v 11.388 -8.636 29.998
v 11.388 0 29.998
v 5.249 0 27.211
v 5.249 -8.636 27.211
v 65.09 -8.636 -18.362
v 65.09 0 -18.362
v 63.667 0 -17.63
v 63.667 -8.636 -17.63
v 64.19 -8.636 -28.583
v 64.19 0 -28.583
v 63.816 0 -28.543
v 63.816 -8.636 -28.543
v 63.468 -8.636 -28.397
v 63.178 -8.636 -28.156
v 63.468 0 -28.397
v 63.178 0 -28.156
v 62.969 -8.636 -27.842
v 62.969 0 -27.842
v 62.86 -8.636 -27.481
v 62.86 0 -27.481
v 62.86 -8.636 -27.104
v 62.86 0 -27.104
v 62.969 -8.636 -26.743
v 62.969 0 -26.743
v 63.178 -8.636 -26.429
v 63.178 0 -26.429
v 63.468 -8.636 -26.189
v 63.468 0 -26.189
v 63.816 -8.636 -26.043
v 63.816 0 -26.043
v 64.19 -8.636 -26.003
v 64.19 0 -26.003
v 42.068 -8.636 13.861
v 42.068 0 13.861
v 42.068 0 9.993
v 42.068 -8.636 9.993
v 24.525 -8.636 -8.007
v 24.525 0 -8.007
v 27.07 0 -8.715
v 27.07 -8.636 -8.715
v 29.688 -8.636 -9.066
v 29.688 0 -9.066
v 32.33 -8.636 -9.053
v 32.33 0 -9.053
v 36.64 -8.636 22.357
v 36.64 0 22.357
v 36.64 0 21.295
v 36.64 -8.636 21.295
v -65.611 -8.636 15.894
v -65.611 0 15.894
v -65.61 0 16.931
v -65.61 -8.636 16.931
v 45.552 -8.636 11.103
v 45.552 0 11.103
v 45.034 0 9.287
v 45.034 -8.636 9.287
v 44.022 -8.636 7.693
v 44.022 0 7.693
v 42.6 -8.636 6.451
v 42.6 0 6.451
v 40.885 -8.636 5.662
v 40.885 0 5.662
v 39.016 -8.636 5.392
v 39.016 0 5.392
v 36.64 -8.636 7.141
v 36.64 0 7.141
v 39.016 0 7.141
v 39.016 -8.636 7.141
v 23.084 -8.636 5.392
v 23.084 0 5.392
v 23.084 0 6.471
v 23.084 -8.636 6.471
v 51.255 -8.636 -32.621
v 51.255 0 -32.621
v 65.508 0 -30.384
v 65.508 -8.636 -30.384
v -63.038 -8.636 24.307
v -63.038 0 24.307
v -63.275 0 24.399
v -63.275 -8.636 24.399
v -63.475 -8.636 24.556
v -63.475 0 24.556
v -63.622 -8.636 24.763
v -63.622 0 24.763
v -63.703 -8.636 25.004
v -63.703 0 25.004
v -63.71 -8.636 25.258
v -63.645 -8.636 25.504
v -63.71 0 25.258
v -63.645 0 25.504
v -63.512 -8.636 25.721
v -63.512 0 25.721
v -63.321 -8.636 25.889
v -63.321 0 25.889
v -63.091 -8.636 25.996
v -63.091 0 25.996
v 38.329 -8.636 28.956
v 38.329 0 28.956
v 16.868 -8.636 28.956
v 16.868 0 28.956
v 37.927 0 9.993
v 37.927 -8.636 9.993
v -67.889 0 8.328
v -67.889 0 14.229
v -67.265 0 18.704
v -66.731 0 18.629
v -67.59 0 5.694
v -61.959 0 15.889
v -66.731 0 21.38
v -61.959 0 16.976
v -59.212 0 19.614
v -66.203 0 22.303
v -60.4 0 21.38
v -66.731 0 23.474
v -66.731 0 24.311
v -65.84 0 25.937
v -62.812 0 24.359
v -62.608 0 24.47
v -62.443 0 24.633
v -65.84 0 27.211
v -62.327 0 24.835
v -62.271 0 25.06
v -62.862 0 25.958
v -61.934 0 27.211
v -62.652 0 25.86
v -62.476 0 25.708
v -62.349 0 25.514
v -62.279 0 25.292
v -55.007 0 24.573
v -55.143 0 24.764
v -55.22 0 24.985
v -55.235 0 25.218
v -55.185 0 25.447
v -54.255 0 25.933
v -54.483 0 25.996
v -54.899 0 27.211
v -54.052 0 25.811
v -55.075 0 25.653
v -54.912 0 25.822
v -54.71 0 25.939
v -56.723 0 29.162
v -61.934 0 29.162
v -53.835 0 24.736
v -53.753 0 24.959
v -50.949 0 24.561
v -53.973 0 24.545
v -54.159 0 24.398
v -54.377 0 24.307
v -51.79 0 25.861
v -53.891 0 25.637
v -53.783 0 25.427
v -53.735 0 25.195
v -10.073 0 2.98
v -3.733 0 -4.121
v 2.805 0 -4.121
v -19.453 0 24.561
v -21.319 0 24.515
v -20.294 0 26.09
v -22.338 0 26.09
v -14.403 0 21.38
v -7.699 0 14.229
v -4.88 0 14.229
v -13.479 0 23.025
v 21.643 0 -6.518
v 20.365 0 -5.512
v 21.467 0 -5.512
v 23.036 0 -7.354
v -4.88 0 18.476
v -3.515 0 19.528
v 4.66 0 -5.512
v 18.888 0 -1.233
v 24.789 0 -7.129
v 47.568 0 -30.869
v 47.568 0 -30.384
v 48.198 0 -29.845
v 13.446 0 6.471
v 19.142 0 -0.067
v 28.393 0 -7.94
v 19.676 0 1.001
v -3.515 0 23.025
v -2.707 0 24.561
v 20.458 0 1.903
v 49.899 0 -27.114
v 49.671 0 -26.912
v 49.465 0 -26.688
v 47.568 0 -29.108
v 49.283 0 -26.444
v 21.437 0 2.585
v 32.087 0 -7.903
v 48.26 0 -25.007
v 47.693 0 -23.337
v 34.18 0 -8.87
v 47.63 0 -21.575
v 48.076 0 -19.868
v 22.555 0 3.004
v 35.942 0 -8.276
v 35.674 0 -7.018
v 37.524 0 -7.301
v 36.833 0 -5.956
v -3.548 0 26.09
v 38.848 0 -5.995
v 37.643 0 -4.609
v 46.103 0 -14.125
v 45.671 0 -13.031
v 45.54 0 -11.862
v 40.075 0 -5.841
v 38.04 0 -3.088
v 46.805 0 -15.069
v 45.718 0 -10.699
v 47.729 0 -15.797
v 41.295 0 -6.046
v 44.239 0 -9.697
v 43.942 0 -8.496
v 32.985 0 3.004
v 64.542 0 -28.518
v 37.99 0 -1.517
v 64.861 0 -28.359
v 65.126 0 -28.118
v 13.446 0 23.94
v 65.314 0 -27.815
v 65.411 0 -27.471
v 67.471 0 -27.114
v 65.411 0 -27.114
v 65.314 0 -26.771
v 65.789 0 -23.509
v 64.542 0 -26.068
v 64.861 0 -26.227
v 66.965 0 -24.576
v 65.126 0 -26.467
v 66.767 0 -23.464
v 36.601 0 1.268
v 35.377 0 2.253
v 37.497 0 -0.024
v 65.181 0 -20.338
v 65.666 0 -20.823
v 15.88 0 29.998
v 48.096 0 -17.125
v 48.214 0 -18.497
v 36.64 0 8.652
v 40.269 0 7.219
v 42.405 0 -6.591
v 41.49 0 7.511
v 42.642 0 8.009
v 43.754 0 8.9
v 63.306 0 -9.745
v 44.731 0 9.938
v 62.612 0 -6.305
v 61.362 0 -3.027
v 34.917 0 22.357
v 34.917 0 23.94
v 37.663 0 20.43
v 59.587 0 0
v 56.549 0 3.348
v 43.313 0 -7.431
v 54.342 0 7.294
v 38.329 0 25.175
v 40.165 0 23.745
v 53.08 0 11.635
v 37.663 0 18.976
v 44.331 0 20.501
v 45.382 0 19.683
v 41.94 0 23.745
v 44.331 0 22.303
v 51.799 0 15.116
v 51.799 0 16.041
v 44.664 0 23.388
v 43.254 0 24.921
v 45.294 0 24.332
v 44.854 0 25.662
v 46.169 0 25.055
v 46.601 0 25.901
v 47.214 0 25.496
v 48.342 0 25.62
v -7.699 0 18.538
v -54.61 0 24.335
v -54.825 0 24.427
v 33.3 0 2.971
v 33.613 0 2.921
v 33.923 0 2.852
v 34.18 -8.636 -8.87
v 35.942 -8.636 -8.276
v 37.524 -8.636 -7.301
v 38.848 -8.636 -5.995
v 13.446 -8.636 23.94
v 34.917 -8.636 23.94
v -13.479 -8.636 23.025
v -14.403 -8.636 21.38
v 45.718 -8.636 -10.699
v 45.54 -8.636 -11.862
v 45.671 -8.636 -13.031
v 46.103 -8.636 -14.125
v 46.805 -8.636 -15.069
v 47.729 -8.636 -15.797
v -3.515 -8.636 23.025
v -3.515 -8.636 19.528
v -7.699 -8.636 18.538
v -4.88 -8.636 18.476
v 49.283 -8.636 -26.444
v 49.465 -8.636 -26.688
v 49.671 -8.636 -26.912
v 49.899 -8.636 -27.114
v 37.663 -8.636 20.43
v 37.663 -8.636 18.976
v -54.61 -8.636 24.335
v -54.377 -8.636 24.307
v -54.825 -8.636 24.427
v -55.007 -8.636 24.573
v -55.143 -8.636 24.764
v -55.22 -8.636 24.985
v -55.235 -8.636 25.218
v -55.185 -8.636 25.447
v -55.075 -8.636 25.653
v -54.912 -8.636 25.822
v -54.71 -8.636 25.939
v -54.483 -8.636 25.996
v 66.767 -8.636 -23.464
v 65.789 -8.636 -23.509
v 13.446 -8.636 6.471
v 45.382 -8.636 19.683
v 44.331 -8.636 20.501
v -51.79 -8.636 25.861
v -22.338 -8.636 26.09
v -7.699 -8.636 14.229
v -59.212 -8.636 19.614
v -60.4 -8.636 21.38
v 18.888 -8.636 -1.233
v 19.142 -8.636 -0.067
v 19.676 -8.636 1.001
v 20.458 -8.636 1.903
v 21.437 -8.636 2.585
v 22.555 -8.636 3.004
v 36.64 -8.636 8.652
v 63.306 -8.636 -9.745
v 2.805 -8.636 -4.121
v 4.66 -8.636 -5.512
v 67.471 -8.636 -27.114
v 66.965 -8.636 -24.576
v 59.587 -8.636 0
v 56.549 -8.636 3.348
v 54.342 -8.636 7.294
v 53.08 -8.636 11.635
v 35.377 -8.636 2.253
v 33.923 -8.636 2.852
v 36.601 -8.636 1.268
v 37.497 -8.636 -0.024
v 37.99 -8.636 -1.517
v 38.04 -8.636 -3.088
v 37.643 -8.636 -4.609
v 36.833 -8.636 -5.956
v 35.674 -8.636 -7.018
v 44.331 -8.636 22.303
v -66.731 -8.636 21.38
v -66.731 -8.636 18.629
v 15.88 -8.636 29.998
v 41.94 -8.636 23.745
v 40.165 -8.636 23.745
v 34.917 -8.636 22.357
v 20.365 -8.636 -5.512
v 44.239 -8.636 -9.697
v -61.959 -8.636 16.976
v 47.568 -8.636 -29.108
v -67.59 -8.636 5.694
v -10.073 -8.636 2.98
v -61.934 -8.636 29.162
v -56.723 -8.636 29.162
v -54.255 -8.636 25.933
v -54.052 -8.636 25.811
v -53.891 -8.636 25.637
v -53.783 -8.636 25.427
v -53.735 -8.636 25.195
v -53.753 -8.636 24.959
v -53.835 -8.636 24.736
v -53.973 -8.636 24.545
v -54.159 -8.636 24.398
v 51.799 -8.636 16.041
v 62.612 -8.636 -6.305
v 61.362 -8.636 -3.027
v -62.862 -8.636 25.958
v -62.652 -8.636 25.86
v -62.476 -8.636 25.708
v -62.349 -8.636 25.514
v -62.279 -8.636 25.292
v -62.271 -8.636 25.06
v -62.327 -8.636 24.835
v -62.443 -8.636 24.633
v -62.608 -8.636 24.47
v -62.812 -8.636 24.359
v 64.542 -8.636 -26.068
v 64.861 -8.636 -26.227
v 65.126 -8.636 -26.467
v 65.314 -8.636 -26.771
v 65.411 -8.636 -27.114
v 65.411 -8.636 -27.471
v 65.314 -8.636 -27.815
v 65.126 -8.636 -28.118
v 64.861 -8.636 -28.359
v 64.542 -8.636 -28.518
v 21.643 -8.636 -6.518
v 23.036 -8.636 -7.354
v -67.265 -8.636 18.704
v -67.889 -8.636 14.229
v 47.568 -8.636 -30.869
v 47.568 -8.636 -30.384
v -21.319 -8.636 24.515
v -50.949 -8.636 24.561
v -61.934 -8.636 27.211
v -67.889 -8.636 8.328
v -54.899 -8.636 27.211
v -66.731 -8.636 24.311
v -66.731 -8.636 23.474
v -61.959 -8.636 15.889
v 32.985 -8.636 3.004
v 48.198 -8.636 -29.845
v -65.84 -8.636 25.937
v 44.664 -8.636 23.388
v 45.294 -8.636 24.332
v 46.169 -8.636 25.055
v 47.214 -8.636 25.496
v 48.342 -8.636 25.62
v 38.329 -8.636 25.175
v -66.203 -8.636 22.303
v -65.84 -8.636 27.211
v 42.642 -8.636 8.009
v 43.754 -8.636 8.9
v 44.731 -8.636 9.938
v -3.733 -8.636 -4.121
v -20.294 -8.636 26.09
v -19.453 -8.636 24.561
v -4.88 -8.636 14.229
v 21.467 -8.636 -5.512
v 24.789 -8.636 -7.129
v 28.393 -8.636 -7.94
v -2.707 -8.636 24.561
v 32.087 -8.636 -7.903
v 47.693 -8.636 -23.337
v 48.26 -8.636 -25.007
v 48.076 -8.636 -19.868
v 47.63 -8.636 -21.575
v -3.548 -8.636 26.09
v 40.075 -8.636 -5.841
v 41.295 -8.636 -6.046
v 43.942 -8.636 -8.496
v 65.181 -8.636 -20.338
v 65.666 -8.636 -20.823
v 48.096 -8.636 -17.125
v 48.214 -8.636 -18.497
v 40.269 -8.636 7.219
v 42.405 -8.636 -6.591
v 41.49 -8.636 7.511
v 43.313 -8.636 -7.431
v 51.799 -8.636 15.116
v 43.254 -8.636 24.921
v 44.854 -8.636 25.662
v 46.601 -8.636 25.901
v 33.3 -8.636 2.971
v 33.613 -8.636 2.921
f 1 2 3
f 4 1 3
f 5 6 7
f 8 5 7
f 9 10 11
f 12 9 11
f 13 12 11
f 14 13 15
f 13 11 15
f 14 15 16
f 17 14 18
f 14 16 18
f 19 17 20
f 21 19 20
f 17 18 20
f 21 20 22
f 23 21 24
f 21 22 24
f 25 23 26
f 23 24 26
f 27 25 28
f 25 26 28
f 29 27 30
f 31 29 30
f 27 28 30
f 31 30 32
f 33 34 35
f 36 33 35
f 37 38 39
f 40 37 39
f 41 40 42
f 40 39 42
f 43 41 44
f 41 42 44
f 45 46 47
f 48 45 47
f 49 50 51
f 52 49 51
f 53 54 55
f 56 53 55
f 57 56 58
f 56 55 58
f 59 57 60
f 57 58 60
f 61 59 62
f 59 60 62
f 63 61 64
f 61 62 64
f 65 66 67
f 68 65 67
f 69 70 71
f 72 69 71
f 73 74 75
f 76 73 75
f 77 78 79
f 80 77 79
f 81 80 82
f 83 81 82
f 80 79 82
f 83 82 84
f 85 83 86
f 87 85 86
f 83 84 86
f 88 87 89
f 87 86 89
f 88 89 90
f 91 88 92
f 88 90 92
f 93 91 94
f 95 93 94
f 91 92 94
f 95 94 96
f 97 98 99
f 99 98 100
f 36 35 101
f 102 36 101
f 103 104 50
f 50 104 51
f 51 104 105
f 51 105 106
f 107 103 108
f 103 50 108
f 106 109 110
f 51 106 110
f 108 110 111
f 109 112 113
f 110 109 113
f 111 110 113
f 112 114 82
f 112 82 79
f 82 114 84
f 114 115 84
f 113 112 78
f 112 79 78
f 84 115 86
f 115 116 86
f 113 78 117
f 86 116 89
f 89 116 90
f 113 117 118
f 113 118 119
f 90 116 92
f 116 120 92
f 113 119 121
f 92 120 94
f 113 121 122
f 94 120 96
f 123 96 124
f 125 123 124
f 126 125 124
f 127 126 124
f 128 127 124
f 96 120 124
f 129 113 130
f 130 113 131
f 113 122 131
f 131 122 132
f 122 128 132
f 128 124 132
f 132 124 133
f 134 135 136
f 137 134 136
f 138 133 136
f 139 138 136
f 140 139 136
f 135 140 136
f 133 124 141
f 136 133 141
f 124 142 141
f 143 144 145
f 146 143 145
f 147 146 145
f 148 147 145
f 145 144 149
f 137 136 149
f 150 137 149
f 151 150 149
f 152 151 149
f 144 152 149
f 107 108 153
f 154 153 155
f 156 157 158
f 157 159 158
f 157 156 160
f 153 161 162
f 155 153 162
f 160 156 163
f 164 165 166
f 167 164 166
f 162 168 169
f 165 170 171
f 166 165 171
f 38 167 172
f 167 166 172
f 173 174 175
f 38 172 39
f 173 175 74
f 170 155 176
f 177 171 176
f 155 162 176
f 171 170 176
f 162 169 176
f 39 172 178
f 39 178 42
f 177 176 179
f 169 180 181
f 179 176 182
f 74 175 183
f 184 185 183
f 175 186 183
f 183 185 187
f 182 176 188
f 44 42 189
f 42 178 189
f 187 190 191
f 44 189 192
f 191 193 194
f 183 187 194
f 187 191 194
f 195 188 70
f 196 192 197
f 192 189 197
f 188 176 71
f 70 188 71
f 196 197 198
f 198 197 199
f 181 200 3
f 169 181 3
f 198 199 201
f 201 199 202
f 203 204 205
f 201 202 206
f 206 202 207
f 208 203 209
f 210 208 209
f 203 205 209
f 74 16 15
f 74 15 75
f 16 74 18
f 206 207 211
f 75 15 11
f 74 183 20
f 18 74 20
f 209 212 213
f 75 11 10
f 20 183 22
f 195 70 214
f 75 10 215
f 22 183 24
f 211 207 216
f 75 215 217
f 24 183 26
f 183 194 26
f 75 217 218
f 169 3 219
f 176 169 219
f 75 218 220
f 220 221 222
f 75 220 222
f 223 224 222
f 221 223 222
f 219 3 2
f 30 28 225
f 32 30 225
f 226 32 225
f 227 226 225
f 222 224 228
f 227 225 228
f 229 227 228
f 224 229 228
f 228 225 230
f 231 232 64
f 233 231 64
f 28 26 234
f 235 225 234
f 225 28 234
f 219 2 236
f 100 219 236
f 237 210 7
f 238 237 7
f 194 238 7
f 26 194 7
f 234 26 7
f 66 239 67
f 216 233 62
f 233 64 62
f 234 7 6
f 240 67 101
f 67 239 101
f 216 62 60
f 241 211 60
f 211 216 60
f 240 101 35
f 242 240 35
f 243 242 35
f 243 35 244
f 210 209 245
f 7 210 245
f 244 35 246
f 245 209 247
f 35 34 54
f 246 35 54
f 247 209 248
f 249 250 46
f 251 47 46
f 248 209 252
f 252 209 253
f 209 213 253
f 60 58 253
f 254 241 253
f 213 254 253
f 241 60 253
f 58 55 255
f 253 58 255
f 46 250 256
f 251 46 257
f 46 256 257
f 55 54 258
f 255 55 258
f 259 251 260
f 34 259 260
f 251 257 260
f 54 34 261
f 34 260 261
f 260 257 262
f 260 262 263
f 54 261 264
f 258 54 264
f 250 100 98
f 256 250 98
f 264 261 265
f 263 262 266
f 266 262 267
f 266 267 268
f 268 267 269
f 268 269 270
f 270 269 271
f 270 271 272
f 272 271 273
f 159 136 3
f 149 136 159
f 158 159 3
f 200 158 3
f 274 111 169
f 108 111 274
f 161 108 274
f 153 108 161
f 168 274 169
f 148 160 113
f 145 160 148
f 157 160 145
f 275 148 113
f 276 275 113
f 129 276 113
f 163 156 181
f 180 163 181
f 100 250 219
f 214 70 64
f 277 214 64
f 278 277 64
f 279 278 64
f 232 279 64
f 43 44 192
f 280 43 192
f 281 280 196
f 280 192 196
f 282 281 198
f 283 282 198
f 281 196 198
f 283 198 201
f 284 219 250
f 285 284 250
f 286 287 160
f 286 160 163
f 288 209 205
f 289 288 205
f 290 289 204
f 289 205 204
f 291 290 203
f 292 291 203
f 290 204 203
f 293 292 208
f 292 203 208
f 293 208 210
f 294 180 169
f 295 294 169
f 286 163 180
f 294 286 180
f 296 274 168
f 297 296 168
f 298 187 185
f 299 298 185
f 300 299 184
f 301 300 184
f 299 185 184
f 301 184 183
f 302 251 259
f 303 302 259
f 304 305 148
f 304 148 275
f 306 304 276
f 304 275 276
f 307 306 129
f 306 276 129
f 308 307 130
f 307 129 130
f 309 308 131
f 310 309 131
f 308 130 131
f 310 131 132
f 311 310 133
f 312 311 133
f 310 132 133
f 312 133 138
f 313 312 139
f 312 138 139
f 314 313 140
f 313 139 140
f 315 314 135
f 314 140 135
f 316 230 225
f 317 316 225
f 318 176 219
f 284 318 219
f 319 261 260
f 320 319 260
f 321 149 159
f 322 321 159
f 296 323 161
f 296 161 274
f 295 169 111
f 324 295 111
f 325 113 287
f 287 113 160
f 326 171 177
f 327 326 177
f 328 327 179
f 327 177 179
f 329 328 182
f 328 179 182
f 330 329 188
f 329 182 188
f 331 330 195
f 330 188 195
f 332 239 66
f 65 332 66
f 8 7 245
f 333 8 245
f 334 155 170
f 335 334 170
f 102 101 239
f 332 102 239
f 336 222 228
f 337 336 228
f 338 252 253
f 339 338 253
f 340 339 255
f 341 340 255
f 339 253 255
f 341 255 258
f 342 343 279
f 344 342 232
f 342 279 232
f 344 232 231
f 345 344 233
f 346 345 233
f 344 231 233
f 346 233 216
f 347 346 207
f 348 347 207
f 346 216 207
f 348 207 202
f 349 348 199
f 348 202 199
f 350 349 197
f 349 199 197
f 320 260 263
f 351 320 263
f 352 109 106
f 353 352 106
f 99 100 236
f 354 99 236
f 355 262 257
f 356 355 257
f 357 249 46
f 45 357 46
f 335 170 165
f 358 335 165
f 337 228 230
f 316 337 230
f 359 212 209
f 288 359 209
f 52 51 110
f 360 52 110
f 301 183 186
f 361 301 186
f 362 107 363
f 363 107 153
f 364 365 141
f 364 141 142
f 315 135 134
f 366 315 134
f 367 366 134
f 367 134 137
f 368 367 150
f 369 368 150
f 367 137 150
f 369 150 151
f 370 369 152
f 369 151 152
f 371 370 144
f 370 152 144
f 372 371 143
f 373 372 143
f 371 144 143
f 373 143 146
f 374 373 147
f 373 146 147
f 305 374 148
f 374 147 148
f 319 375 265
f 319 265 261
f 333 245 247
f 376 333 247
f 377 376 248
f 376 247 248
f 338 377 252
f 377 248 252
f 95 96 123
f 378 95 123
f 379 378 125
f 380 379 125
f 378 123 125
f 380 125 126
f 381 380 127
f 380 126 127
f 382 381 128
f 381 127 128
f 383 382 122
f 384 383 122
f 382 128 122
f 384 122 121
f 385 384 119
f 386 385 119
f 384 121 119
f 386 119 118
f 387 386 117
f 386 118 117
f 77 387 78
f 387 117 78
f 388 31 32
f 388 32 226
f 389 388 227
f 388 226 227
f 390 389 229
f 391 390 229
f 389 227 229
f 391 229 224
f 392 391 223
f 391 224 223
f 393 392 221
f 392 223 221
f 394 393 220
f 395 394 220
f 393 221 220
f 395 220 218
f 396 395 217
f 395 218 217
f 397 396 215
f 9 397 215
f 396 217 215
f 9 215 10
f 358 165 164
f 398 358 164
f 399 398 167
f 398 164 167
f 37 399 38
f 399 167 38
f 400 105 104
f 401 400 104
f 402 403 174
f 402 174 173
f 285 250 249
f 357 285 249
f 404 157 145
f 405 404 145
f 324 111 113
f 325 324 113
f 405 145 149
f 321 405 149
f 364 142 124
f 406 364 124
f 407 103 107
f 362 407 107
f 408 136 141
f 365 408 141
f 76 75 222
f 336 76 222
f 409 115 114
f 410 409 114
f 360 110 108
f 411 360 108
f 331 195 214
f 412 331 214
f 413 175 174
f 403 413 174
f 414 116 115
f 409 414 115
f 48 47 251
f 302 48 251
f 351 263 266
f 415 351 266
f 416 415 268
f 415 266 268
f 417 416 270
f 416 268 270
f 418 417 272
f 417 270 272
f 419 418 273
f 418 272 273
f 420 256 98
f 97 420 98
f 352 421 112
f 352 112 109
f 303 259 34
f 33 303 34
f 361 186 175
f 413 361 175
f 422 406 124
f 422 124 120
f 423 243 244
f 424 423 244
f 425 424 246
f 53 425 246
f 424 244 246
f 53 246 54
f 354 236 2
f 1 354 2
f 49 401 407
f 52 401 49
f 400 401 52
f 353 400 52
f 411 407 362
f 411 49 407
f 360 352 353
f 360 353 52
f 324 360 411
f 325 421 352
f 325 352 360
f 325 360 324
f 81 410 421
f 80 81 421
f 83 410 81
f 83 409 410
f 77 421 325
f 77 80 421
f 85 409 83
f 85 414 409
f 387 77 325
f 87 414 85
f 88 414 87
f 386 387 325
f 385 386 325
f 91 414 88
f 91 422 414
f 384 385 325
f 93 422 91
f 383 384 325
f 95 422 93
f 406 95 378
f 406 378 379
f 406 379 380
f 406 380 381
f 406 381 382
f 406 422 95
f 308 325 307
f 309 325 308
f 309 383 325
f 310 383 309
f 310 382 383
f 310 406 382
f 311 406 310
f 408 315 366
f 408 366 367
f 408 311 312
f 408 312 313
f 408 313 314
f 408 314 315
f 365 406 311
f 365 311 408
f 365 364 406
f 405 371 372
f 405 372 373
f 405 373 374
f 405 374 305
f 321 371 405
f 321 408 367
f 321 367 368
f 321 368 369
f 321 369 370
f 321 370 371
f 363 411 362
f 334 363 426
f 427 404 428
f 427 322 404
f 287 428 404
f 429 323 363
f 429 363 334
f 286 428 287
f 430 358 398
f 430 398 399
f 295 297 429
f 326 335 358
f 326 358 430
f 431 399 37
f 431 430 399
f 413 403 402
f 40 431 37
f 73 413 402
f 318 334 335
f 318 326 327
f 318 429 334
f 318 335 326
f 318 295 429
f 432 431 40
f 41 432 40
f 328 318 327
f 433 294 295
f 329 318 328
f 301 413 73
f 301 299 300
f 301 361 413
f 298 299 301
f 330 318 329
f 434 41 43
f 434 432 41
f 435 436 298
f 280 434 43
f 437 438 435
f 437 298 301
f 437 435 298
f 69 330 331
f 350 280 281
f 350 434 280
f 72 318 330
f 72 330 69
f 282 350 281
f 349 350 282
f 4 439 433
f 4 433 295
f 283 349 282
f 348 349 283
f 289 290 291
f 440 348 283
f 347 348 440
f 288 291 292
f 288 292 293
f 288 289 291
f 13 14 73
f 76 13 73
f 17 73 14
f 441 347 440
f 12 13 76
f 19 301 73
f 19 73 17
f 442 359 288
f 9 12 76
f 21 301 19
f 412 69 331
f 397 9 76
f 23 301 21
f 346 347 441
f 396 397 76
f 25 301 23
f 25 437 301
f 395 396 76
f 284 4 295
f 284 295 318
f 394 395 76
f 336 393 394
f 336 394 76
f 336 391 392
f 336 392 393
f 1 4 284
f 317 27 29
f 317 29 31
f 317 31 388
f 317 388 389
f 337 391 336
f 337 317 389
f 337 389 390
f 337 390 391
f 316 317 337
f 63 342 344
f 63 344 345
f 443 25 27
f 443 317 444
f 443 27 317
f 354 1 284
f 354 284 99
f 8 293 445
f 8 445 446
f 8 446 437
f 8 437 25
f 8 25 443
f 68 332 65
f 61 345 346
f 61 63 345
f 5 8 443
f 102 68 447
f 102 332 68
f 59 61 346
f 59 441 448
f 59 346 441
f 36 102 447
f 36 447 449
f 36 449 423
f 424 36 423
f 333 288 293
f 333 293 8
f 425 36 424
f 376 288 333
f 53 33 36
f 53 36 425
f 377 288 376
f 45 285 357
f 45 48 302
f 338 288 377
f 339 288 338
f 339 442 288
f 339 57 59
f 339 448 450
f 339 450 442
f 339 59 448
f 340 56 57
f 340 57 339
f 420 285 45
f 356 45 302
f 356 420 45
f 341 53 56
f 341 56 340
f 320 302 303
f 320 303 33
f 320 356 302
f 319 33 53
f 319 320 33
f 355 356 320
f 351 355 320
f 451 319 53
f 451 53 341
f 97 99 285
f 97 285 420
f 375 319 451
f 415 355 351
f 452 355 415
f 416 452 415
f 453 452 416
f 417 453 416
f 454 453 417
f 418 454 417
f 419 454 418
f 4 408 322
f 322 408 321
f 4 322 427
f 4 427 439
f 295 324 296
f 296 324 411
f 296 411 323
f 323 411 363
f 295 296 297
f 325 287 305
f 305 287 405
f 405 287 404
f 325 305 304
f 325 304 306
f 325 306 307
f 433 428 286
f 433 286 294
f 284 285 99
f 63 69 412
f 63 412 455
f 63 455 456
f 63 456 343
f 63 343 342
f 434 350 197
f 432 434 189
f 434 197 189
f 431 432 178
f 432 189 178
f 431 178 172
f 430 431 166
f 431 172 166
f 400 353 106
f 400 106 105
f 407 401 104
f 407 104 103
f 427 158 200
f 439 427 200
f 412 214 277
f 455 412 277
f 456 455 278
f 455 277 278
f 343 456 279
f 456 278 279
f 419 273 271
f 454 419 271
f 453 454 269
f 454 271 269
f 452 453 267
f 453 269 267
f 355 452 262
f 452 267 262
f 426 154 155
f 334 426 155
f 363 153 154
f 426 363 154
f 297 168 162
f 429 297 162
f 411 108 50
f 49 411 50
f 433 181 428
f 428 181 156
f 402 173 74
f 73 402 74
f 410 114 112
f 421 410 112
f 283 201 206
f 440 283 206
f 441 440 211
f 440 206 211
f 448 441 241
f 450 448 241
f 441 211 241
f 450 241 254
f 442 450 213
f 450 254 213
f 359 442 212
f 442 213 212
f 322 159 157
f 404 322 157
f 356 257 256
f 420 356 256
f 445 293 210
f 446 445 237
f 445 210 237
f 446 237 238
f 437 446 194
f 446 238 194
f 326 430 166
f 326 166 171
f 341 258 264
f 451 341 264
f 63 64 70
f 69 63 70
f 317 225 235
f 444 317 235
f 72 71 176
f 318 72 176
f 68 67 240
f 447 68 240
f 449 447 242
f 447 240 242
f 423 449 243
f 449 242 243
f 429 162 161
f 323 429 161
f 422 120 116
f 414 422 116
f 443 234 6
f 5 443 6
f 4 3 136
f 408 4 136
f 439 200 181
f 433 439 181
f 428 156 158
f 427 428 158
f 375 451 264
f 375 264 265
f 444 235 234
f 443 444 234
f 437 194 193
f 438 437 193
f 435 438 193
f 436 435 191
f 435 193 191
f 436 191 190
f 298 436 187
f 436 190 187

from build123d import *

# Parameters (mm, degrees)
F1_DEPTH = 8.636


with BuildPart() as f1:
    # F0 (on Front) → F1 (new body)
    with BuildSketch(Plane.XZ):
        with BuildLine():
            Line((-67.888543, 14.229136), (-67.888543, 8.327846))
            Line((-67.888543, 8.327846), (-67.590117, 5.694489))
            Line((-67.590117, 5.694489), (-10.072526, 2.980128))
            Line((-10.072526, 2.980128), (-3.732844, -4.12088))
            Line((-3.732844, -4.12088), (2.804628, -4.12088))
            Line((2.804628, -4.12088), (4.660426, -5.51241))
            Line((4.660426, -5.51241), (20.36539, -5.51241))
            ThreePointArc((20.36539, -5.51241), (22.326214, -6.957719), (24.524612, -8.006907))
            ThreePointArc((24.524612, -8.006907), (28.372895, -8.935837), (32.329973, -9.052986))
            ThreePointArc((32.329973, -9.052986), (35.941526, -8.275719), (38.847856, -5.995215))
            ThreePointArc((38.847856, -5.995215), (42.405349, -6.590703), (44.239189, -9.696728))
            Line((44.239189, -9.696728), (45.717698, -10.69943))
            ThreePointArc((45.717698, -10.69943), (45.850918, -13.592314), (47.728516, -15.797116))
            ThreePointArc((47.728516, -15.797116), (48.186683, -17.808436), (48.07616, -19.868318))
            ThreePointArc((48.07616, -19.868318), (47.693475, -23.337022), (49.28254, -26.443986))
            ThreePointArc((49.28254, -26.443986), (49.565033, -26.802415), (49.898703, -27.113765))
            Line((49.898703, -27.113765), (63.92391, -23.246003))
            Line((63.92391, -23.246003), (63.666757, -17.629698))
            Line((63.666757, -17.629698), (63.305743, -9.745057))
            ThreePointArc((63.305743, -9.745057), (62.05497, -4.640389), (59.587408, 0))
            ThreePointArc((59.587408, 0), (55.333048, 5.257953), (53.080335, 11.635331))
            Line((53.080335, 11.635331), (51.798906, 15.11586))
            Line((51.798906, 15.11586), (46.942841, 15.11586))
            ThreePointArc((46.942841, 15.11586), (46.45979, 13.035678), (45.55238, 11.102519))
            ThreePointArc((45.55238, 11.102519), (43.355932, 7.020729), (39.016269, 5.392008))
            Line((39.016269, 5.392008), (23.084078, 5.392008))
            Line((23.084078, 5.392008), (23.084078, 6.470653))
            Line((23.084078, 6.470653), (15.109499, 6.470653))
            Line((15.109499, 6.470653), (13.445796, 6.470653))
            Line((13.445796, 6.470653), (13.445796, 11.590629))
            Line((13.445796, 11.590629), (13.445796, 18.615682))
            Line((13.445796, 18.615682), (7.789209, 18.615682))
            Line((7.789209, 18.615682), (-7.699287, 18.537793))
            Line((-7.699287, 18.537793), (-4.879672, 18.475959))
            Line((-4.879672, 18.475959), (-4.879672, 14.229136))
            Line((-4.879672, 14.229136), (-7.699287, 14.229136))
            Line((-7.699287, 14.229136), (-67.888543, 14.229136))
        make_face()
        with BuildLine():
            ThreePointArc((18.888429, -1.232992), (20.03881, 1.476523), (22.555076, 3.004023))
            Line((22.555076, 3.004023), (28.890261, 3.004023))
            Line((28.890261, 3.004023), (32.984652, 3.004023))
            ThreePointArc((32.984652, 3.004023), (33.457255, 2.948329), (33.923268, 2.851961))
            ThreePointArc((33.923268, 2.851961), (37.989765, -1.51717), (35.673525, -7.018146))
            ThreePointArc((35.673525, -7.018146), (28.392646, -7.940351), (21.466842, -5.51241))
            Line((21.466842, -5.51241), (18.888429, -1.232992))
        make_face(mode=Mode.SUBTRACT)
        Polygon((-67.26525, 18.70371), (-67.888543, 14.229136), (-7.699287, 14.229136), (-7.699287, 18.537793), (-66.731323, 18.629336), align=None)
        Polygon((-65.611368, 15.894235), (-65.609761, 16.930796), (-61.958702, 16.97587), (-61.958702, 15.888571), align=None, mode=Mode.SUBTRACT)
        Polygon((-66.731323, 21.379774), (-66.731323, 18.629336), (-7.699287, 18.537793), (7.789209, 18.615682), (13.445796, 18.615682), (13.445796, 20.43255), (13.445796, 23.939529), (11.8609, 24.011148), (10.443351, 22.458594), (3.288107, 22.458594), (2.613084, 23.025269), (-3.514589, 23.025269), (-3.514589, 19.527677), (-59.21186, 19.614049), (-60.399957, 21.379774), align=None)
        Polygon((-66.20314, 22.302656), (-66.731323, 21.379774), (-60.399957, 21.379774), (-14.40332, 21.379774), (-13.479427, 23.025269), (-3.514589, 23.025269), (2.613084, 23.025269), (2.580326, 23.198023), (-17.181331, 23.198023), (-17.794525, 22.302656), align=None)
        with BuildLine():
            Line((-66.731323, 23.473777), (-66.20314, 22.302656))
            Line((-66.20314, 22.302656), (-17.794525, 22.302656))
            Line((-17.794525, 22.302656), (-17.181331, 23.198023))
            Line((-17.181331, 23.198023), (2.580326, 23.198023))
            Line((2.580326, 23.198023), (2.613084, 23.025269))
            Line((2.613084, 23.025269), (3.288107, 22.458594))
            Line((3.288107, 22.458594), (10.443351, 22.458594))
            Line((10.443351, 22.458594), (11.8609, 24.011148))
            Line((11.8609, 24.011148), (13.445796, 23.939529))
            Line((13.445796, 23.939529), (34.916848, 23.939529))
            Line((34.916848, 23.939529), (34.916848, 22.35744))
            Line((34.916848, 22.35744), (36.640268, 22.35744))
            Line((36.640268, 22.35744), (36.640268, 21.295426))
            Line((36.640268, 21.295426), (37.662946, 20.430082))
            Line((37.662946, 20.430082), (37.662946, 18.97577))
            Line((37.662946, 18.97577), (42.068332, 13.861337))
            Line((42.068332, 13.861337), (42.068332, 9.9928))
            Line((42.068332, 9.9928), (37.926942, 9.9928))
            Line((37.926942, 9.9928), (36.640268, 8.652356))
            Line((36.640268, 8.652356), (36.640268, 7.140663))
            Line((36.640268, 7.140663), (39.016269, 7.140663))
            ThreePointArc((39.016269, 7.140663), (40.885778, 7.338312), (42.642005, 8.008977))
            ThreePointArc((42.642005, 8.008977), (44.260743, 9.401881), (45.55238, 11.102519))
            ThreePointArc((45.55238, 11.102519), (46.45979, 13.035678), (46.942841, 15.11586))
            Line((46.942841, 15.11586), (51.798906, 15.11586))
            Line((51.798906, 15.11586), (51.798906, 16.040822))
            Line((51.798906, 16.040822), (45.381963, 19.682869))
            Line((45.381963, 19.682869), (42.202402, 18.006373))
            Line((42.202402, 18.006373), (40.930577, 18.006373))
            Line((40.930577, 18.006373), (38.329113, 19.682869))
            Line((38.329113, 19.682869), (38.329113, 25.174845))
            Line((38.329113, 25.174845), (38.329113, 28.956141))
            Line((38.329113, 28.956141), (16.867928, 28.956141))
            Line((16.867928, 28.956141), (15.879637, 29.998008))
            Line((15.879637, 29.998008), (15.187833, 29.998008))
            Line((15.187833, 29.998008), (11.387558, 29.998008))
            Line((11.387558, 29.998008), (5.248655, 27.211197))
            Line((5.248655, 27.211197), (-54.899268, 27.211197))
            Line((-54.899268, 27.211197), (-61.934408, 27.211197))
            Line((-61.934408, 27.211197), (-65.839738, 27.211197))
            Line((-65.839738, 27.211197), (-65.839738, 25.936976))
            Line((-65.839738, 25.936976), (-66.731323, 24.311243))
            Line((-66.731323, 24.311243), (-66.731323, 23.473777))
        make_face()
        with BuildLine():
            ThreePointArc((-63.038021, 24.306566), (-63.715772, 25.131149), (-63.090824, 25.996437))
            ThreePointArc((-63.090824, 25.996437), (-62.267006, 25.176418), (-63.038021, 24.306566))
        make_face(mode=Mode.SUBTRACT)
        with BuildLine():
            ThreePointArc((-54.377425, 24.306566), (-55.235893, 25.101148), (-54.483041, 25.996437))
            ThreePointArc((-54.483041, 25.996437), (-53.73549, 25.194922), (-54.377425, 24.306566))
        make_face(mode=Mode.SUBTRACT)
        Polygon((-50.948696, 24.560757), (-51.789809, 25.860662), (-22.338423, 26.090056), (-21.319148, 24.51481), align=None, mode=Mode.SUBTRACT)
        Polygon((-2.707183, 24.560757), (-19.452998, 24.560757), (-20.294111, 26.090056), (-3.548297, 26.090056), align=None, mode=Mode.SUBTRACT)
        Polygon((-61.934408, 29.162308), (-61.934408, 27.211197), (-54.899268, 27.211197), (-56.723192, 29.162308), align=None)
        Polygon((63.92391, -23.246003), (49.898703, -27.113765), (47.567636, -29.108122), (48.197687, -29.844546), (47.567636, -30.38359), (60.629882, -27.680274), (61.969539, -25.573865), (66.964559, -24.576284), (66.767075, -23.464401), (65.788557, -23.509205), (65.665543, -20.822546), (65.180847, -20.337525), (65.090388, -18.361883), (63.666757, -17.629698), align=None)
        Polygon((42.202402, 18.006373), (45.381963, 19.682869), (44.331331, 20.500985), (40.165214, 23.745094), (38.329113, 25.174845), (38.329113, 19.682869), (40.930577, 18.006373), align=None)
        with BuildLine():
            Line((40.165214, 23.745094), (44.331331, 20.500985))
            Line((44.331331, 20.500985), (44.331331, 22.302926))
            ThreePointArc((44.331331, 22.302926), (45.705089, 24.725057), (48.342105, 25.619529))
            ThreePointArc((48.342105, 25.619529), (44.854467, 25.661592), (41.94029, 23.745094))
            Line((41.94029, 23.745094), (40.165214, 23.745094))
        make_face()
        Polygon((60.629882, -27.680274), (47.567636, -30.38359), (47.567636, -30.86937), (51.254567, -32.621317), (65.507576, -30.38359), (67.471333, -27.113765), (66.964559, -24.576284), (61.969539, -25.573865), align=None)
        with BuildLine():
            ThreePointArc((64.190447, -28.582929), (62.846638, -27.292852), (64.190447, -26.002776))
            ThreePointArc((64.190447, -26.002776), (65.423903, -27.292852), (64.190447, -28.582929))
        make_face(mode=Mode.SUBTRACT)
    extrude(amount=F1_DEPTH)


solid = f1.part
